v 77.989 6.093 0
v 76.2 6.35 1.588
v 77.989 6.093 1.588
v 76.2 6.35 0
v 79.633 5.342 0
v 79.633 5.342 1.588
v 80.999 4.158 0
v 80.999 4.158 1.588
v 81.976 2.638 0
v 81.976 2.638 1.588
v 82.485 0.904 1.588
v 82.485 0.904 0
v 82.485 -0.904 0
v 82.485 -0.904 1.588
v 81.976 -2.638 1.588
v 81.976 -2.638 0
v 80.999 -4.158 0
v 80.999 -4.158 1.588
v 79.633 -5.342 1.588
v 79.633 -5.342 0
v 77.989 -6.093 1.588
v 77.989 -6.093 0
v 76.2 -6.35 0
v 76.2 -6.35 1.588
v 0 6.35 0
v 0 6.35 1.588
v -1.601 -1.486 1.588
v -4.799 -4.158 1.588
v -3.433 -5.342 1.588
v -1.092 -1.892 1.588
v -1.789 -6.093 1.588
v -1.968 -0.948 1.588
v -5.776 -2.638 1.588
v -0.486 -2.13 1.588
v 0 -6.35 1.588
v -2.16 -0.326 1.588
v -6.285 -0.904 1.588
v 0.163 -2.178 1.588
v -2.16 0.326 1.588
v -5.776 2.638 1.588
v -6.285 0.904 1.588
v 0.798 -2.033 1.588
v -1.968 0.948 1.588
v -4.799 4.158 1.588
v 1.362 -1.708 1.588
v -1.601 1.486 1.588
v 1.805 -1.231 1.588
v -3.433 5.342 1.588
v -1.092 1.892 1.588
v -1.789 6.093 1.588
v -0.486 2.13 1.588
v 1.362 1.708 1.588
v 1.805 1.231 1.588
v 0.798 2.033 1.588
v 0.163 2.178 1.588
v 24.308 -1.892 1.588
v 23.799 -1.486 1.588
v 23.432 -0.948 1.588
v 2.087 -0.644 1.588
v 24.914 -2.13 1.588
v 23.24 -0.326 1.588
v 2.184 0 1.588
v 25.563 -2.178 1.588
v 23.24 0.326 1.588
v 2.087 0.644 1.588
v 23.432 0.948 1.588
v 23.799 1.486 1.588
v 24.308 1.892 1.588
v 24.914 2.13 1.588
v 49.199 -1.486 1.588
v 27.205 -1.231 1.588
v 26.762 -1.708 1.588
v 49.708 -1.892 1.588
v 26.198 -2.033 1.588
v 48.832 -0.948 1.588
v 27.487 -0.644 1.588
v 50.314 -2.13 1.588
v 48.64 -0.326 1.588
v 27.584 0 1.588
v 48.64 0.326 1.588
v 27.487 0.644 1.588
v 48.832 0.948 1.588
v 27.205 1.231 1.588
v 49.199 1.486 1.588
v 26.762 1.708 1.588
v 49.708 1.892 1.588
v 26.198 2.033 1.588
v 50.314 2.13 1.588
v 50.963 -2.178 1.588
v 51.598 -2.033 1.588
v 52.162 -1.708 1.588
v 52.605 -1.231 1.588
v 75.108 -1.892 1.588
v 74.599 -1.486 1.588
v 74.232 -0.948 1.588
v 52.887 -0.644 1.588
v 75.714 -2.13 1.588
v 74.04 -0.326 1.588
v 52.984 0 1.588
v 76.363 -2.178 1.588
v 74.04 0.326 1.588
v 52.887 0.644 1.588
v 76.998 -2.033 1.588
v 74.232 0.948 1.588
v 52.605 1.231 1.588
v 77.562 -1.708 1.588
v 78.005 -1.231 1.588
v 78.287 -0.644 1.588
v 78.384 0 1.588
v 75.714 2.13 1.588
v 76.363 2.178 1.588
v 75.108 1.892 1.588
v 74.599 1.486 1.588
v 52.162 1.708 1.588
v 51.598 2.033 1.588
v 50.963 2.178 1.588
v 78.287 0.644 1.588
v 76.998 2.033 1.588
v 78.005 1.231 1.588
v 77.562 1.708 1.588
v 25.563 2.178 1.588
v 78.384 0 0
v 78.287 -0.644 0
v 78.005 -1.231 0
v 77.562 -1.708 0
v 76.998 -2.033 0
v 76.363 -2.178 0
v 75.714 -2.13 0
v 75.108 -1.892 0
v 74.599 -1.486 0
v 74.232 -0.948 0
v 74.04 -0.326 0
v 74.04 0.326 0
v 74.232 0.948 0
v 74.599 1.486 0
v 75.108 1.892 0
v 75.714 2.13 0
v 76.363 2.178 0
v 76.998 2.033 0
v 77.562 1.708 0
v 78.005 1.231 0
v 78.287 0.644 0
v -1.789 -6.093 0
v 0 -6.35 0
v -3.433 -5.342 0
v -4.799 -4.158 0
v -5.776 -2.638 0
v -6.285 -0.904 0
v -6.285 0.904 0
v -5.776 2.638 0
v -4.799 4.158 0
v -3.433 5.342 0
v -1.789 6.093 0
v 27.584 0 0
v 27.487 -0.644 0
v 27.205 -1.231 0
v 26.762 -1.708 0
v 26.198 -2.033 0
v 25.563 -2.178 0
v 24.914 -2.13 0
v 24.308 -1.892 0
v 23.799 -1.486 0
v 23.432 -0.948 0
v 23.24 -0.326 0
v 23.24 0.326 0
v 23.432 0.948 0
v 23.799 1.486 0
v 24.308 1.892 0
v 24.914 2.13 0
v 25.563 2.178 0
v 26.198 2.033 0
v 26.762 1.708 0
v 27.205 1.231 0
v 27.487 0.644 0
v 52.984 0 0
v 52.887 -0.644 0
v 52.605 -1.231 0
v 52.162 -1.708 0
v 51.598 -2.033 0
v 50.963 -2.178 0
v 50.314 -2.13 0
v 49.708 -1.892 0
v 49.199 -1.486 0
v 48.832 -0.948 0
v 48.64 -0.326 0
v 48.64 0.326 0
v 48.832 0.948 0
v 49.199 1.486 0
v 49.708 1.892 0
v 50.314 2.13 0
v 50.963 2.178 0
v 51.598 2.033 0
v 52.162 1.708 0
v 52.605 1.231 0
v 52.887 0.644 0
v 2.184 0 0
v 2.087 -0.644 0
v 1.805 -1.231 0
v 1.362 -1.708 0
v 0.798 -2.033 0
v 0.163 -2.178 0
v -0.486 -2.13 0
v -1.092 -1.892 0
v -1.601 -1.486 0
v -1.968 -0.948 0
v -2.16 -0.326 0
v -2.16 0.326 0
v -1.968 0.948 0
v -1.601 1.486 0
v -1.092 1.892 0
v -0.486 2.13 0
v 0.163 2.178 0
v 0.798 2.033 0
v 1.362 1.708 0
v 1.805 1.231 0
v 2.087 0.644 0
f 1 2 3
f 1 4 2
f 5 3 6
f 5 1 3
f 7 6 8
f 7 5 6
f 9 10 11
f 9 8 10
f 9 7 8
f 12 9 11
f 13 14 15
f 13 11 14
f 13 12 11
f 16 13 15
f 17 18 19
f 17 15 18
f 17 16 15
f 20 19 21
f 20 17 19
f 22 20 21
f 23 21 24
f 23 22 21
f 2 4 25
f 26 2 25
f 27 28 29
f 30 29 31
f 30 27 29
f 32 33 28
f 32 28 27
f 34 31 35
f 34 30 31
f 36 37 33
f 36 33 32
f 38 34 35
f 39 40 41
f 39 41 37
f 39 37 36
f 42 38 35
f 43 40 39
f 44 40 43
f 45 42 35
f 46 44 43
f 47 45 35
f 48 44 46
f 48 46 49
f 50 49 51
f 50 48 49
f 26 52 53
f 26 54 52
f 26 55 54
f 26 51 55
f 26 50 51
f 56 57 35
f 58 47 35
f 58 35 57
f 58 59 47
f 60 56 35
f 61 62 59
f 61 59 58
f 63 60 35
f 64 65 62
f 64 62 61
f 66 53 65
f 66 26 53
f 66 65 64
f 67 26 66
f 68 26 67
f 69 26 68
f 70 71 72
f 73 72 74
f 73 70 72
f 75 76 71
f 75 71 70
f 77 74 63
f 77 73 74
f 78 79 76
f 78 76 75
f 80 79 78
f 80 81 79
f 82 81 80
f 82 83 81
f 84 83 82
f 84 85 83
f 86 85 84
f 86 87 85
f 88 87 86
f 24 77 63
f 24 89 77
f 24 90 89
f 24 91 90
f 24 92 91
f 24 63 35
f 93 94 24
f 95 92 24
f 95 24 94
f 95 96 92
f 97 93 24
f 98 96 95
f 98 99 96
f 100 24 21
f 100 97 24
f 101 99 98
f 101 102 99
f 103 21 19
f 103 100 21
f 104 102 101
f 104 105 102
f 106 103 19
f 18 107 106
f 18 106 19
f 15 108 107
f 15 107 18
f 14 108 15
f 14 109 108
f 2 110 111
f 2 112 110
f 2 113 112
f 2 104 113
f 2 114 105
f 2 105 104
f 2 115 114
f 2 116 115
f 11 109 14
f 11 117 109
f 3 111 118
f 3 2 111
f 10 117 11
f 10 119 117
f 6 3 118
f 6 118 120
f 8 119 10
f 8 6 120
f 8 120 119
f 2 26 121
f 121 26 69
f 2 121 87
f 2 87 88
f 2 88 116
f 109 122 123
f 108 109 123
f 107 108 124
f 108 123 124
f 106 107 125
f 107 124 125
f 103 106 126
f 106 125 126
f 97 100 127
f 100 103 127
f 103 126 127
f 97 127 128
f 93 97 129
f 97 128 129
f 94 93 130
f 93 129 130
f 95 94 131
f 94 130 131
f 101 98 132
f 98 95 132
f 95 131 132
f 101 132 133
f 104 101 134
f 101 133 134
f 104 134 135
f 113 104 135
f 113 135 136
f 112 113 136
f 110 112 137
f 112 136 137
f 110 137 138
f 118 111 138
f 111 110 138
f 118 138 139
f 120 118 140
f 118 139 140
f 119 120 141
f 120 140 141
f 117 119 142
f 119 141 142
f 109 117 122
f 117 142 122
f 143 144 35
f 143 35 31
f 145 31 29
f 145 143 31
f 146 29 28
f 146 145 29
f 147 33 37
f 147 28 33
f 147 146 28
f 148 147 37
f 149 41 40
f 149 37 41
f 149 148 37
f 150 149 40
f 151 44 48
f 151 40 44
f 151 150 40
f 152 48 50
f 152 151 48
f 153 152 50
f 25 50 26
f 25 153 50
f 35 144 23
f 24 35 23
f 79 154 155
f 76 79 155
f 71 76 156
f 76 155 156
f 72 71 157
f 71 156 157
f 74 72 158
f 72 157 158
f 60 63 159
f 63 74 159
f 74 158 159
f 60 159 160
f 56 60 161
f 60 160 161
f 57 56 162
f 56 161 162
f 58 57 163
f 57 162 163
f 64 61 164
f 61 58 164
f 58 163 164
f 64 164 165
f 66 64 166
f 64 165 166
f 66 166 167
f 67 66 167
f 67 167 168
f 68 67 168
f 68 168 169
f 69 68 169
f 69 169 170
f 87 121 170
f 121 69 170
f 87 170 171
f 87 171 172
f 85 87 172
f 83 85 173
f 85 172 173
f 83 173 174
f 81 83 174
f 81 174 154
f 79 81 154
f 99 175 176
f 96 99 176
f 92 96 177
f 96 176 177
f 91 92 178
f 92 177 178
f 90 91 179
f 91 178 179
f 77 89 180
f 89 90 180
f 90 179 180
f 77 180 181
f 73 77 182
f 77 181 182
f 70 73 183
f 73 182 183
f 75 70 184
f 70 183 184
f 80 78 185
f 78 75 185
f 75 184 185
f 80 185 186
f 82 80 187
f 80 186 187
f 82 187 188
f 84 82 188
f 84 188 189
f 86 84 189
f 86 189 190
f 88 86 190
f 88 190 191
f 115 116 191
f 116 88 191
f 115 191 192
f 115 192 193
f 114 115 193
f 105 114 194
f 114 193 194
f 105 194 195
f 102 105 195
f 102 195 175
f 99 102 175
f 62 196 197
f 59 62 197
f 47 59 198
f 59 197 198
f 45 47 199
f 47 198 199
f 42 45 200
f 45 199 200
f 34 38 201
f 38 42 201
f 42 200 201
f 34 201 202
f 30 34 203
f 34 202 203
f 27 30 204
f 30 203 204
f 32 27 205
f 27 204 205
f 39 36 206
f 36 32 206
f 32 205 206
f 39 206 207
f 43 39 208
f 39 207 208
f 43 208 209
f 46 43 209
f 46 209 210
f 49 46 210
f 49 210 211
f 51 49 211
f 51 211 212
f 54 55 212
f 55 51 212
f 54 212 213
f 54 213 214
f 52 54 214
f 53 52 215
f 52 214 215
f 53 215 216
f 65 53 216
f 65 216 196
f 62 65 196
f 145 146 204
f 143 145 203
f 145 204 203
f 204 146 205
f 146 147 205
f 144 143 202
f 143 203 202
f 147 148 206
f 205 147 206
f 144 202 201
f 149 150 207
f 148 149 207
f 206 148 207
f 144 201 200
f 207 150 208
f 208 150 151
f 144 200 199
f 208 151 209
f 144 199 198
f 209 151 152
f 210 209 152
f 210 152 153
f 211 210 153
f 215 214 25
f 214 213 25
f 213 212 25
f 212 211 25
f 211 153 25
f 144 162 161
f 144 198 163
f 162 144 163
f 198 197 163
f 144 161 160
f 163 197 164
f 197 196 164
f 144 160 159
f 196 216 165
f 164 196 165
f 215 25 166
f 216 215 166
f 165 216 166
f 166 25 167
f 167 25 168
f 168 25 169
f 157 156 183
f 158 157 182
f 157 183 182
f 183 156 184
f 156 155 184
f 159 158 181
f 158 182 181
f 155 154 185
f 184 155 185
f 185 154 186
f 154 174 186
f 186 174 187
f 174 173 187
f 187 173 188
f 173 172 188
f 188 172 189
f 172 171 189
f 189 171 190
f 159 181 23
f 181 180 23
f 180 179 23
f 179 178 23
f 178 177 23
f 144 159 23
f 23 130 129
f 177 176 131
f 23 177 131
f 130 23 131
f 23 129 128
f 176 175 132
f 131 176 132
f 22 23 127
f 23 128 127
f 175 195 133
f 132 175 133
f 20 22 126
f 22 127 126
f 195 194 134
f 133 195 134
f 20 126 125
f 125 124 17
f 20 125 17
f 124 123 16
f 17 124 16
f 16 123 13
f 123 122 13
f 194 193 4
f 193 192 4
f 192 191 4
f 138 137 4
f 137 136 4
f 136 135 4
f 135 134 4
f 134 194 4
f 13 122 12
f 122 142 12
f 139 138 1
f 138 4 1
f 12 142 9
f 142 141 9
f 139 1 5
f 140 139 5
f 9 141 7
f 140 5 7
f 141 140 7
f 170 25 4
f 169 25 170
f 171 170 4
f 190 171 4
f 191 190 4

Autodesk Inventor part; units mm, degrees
ref_plane "YZ Plane" through (0, 0, 0) normal (1, 0, 0) x (0, 1, 0)
ref_plane "XZ Plane" through (0, 0, 0) normal (0, 1, 0) x (-1, 0, 0)
ref_plane "XY Plane" through (0, 0, 0) normal (0, 0, 1) x (1, 0, 0)
sketch "Sketch1" plane through (0, 0, 0) normal (0, 0, 1) x (1, 0, 0)
  circle A0 centre (0, 0) radius 2.1844
  circle A1 centre (76.2, 0) radius 2.1844
  circle A2 centre (25.4, 0) radius 2.1844
  circle A3 centre (50.8, 0) radius 2.1844
  line L0 (0, -6.35) -> (76.2, -6.35)
  arc A4 (76.2, -6.35) -> (76.2, 6.35) centre (76.2, 0) ccw
  line L1 (76.2, 6.35) -> (0, 6.35)
  arc A5 (0, 6.35) -> (0, -6.35) centre (0, 0) ccw
  dimension "d0" = 4.3688
  dimension "d6" = 4.3688
  dimension "d12" = 4.3688
  dimension "d13" = 25.4
  dimension "d14" = 76.2
  dimension "d15" = 4.3688
  dimension "d16" = 25.4
  dimension "d17" = 76.2
  dimension "d20" = 76.2
extrude "Extrusion2" add sketch "Sketch1" along normal blind 1.5875
properties part number "2ndpreroller" material "Polycarbonate, Clear"
